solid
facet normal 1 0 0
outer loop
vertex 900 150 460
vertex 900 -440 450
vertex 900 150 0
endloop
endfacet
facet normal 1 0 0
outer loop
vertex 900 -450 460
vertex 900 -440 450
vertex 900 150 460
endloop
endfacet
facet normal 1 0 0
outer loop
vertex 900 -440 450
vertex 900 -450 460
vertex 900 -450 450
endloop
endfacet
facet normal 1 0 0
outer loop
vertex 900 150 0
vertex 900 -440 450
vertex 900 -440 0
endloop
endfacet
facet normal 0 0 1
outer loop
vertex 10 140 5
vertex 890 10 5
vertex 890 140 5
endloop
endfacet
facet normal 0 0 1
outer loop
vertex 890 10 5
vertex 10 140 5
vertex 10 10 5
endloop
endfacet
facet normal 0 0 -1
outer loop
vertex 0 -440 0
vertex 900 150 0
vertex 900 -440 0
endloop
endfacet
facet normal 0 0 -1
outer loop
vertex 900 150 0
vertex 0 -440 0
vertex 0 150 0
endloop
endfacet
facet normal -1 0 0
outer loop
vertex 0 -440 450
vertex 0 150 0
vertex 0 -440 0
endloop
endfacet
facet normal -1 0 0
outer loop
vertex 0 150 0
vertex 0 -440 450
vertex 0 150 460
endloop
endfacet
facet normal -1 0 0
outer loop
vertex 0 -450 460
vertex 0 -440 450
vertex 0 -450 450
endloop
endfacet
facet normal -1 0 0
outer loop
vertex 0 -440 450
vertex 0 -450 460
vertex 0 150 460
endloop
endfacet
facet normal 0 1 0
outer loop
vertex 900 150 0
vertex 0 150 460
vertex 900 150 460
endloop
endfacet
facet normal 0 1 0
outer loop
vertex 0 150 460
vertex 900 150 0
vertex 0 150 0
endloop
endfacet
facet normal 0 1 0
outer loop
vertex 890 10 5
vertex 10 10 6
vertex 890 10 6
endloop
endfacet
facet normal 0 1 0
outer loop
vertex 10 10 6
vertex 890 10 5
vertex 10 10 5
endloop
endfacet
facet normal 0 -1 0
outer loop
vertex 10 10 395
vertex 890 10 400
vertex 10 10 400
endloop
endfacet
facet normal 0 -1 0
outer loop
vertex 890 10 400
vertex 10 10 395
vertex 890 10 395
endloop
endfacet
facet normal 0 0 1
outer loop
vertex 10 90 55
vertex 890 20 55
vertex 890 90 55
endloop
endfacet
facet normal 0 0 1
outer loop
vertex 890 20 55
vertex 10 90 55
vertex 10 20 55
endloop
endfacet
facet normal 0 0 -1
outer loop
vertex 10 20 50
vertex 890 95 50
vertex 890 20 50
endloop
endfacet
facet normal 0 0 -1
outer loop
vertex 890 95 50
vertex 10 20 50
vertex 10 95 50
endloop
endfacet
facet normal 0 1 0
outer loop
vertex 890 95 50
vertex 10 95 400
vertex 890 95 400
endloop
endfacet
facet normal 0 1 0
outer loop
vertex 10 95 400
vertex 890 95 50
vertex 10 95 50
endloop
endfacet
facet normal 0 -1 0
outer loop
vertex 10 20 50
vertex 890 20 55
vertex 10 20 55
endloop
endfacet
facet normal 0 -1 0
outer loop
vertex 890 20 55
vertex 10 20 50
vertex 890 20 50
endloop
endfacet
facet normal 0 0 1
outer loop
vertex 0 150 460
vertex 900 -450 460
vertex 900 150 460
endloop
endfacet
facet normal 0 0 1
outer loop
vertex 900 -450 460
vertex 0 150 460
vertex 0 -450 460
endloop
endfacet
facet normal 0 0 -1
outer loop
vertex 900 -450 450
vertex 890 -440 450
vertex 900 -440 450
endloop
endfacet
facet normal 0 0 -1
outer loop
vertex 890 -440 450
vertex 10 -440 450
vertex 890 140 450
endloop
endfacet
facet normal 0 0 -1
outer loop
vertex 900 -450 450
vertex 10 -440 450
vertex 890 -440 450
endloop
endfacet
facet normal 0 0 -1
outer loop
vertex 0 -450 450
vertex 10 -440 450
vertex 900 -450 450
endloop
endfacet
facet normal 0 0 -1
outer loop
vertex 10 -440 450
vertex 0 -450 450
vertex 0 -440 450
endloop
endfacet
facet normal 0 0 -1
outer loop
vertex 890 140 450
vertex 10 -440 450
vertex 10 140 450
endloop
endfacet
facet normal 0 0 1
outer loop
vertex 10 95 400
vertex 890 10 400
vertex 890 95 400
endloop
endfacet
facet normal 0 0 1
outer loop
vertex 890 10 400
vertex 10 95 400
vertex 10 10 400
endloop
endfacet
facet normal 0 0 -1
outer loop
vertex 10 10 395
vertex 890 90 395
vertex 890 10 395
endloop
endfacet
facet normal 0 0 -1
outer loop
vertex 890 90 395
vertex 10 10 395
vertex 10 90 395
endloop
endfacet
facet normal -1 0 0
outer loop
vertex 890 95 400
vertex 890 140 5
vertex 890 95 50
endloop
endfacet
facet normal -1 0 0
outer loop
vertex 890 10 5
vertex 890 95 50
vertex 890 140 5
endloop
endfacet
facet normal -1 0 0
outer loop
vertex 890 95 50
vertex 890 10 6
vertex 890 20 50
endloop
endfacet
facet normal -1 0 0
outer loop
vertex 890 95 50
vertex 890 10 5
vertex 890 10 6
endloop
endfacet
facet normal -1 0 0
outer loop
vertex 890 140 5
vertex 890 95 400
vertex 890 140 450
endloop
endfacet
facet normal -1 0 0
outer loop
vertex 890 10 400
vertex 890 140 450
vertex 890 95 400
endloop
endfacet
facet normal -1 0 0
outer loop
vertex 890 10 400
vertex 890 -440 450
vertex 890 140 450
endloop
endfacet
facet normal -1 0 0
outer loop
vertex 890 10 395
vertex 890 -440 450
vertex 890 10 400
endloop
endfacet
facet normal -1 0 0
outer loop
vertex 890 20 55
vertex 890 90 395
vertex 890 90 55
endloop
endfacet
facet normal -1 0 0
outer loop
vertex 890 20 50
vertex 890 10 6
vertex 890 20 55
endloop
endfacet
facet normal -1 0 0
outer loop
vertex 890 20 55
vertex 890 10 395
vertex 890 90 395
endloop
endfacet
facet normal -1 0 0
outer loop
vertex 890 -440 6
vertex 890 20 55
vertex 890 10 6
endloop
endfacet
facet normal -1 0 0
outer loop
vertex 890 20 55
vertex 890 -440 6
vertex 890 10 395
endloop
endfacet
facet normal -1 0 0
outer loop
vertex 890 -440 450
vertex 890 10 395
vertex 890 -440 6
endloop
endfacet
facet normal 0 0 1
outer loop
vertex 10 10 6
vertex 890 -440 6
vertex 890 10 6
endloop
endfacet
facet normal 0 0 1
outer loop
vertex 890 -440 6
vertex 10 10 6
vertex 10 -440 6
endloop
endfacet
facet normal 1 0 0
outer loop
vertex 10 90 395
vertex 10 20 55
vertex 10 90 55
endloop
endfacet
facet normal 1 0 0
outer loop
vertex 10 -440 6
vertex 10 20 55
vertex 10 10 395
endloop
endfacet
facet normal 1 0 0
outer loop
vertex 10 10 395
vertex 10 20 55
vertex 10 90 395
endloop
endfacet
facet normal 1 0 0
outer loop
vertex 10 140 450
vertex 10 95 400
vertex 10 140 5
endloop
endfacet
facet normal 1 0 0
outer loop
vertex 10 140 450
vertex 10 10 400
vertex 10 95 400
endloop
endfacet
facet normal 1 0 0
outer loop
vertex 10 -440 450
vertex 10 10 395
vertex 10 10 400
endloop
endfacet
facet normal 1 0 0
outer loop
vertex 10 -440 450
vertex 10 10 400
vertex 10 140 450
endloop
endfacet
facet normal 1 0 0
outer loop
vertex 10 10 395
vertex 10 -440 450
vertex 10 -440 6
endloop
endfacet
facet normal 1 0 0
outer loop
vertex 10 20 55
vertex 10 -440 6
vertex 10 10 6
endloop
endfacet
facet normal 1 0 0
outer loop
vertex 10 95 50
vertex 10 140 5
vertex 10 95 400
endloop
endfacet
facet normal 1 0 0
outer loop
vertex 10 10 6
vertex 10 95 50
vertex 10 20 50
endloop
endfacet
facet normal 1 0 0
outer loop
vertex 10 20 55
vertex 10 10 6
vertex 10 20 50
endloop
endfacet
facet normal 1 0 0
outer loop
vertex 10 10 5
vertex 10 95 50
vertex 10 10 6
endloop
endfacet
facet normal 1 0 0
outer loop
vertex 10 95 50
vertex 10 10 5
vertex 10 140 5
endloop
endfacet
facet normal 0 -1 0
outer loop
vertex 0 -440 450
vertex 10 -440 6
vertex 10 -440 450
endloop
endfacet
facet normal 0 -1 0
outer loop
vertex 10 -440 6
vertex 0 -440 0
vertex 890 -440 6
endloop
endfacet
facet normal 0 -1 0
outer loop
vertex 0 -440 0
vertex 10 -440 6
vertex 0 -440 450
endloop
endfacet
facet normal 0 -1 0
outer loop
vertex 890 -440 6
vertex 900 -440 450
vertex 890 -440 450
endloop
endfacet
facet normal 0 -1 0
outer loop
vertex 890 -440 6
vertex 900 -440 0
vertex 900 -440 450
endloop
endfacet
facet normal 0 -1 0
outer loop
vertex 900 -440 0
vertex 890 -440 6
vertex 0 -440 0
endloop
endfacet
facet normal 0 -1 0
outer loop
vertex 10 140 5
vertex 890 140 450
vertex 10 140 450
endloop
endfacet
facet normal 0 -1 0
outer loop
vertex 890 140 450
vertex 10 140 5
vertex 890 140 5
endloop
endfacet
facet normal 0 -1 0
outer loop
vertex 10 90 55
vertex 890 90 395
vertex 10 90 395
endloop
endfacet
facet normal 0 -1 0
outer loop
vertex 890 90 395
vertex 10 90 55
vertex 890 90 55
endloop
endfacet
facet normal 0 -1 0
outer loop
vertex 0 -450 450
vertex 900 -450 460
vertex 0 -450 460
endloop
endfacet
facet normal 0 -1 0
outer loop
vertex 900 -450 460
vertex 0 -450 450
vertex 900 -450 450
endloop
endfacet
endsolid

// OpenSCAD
//size in mm
height = 450;
width  = 900;
depth  = 150;

//material standard sizes
plasticSize1 = 1;
glassSize1   = 5;
plywoodSize1 = 5;
plywoodSize2 = 10;
plywoodSize3 = 15;

//Computing sizes
ExhaustExtHeight = 50;

//Module Part definition
module BackPanel(){
    cube([
        width - (plywoodSize2*2),
        plywoodSize2, 
        height - plywoodSize1
    ]);
}

module Pegboard(){
    cube([
        width - plywoodSize2,
        plywoodSize1,
        height-(ExhaustExtHeight*2) - (plywoodSize1*2)
    ]);
}

module SidePanel(){
    cube([
        plywoodSize2,
        depth  - plywoodSize2,
        height - plywoodSize1,
    ]);
}

module CellingPanel(){
    cube([
        width,
        depth,
        plywoodSize2
    ]);
}
module FloorPanel(){
    cube([
        width,
        depth-plywoodSize2,
        plywoodSize1
    ]);
}

module ExhaustInternalPanel(){
    cube([
        width - plywoodSize2,
        depth - ExhaustExtHeight - plywoodSize1 - plywoodSize2,
        plywoodSize1
    ]);
}

module BottomExhaustTopPanel(){
    cube([
        width - plywoodSize2,
        depth - ExhaustExtHeight - plywoodSize2*2 - plywoodSize1,
        plywoodSize1
    ]);
}

module BottonExhaustSupport(){
    cube([
        plywoodSize1,
        depth-ExhaustExtHeight - plywoodSize2,
        ExhaustExtHeight - (plywoodSize1*2)
    ]);
}

module TopExhaustEntrance(){
    translate([0,0,height])
        CellingPanel();
    translate([plywoodSize1,plywoodSize2,
        height- ExhaustExtHeight - plywoodSize2 + plywoodSize1])
        ExhaustInternalPanel();
}

module BottonExhaustEntrande(){
    translate([0, plywoodSize2, 0])
        FloorPanel();
    translate([plywoodSize1,
        plywoodSize2*2,
        ExhaustExtHeight])
        BottomExhaustTopPanel();
}

module LeftFoldingDoor(){
    cube([
        plywoodSize2,
        height,
        height
    ]);
}

module RightFoldingDoor(){
    cube([
        plywoodSize2,
        height,
        height
    ]);
}

module FoldingCelling(){
    cube([
        width,
        height,
        plywoodSize2
    ]);
}

module BottonExhaustCover(){
    cube([
        width - (plywoodSize2),
        ExhaustExtHeight,
        plywoodSize1
    ]);
}

module SolderingFloor(){
    cube([
        width - (plywoodSize2*2),
        height - ExhaustExtHeight,
        plywoodSize1
    ]);
}

module PaintingFloor(){
    cube([
        width - (plywoodSize2*2),
        height,
        plasticSize1
    ]);
}

module FoldingFloor(){
    translate([plywoodSize2
        ,plywoodSize2-height
        ,plasticSize1])
        SolderingFloor();
    translate([plywoodSize2,
        plywoodSize2- ExhaustExtHeight,plasticSize1])
        BottonExhaustCover();
    translate([plywoodSize2,
    plywoodSize2-height,0])
        PaintingFloor();
}

//Mounting parts
    //Backpanel
translate([plywoodSize2,
    depth - plywoodSize2,
    plywoodSize1])
    BackPanel();

    //Pegboard
translate([plywoodSize1,
    depth - plywoodSize2 - ExhaustExtHeight,
    ExhaustExtHeight + plywoodSize1])
    Pegboard();

    //Right Side Panel
translate([0, plywoodSize2 , plywoodSize1])
    SidePanel();

    //Left Side Panel
translate([width-plywoodSize2, plywoodSize2 , plywoodSize1])
    SidePanel();

BottonExhaustEntrande();
TopExhaustEntrance();

translate([0,-height+plywoodSize2,0])
    LeftFoldingDoor();

translate([width-plywoodSize2,-height+plywoodSize2,0])
    RightFoldingDoor();

translate([0,0-height,height])
    FoldingCelling();
    
FoldingFloor();
